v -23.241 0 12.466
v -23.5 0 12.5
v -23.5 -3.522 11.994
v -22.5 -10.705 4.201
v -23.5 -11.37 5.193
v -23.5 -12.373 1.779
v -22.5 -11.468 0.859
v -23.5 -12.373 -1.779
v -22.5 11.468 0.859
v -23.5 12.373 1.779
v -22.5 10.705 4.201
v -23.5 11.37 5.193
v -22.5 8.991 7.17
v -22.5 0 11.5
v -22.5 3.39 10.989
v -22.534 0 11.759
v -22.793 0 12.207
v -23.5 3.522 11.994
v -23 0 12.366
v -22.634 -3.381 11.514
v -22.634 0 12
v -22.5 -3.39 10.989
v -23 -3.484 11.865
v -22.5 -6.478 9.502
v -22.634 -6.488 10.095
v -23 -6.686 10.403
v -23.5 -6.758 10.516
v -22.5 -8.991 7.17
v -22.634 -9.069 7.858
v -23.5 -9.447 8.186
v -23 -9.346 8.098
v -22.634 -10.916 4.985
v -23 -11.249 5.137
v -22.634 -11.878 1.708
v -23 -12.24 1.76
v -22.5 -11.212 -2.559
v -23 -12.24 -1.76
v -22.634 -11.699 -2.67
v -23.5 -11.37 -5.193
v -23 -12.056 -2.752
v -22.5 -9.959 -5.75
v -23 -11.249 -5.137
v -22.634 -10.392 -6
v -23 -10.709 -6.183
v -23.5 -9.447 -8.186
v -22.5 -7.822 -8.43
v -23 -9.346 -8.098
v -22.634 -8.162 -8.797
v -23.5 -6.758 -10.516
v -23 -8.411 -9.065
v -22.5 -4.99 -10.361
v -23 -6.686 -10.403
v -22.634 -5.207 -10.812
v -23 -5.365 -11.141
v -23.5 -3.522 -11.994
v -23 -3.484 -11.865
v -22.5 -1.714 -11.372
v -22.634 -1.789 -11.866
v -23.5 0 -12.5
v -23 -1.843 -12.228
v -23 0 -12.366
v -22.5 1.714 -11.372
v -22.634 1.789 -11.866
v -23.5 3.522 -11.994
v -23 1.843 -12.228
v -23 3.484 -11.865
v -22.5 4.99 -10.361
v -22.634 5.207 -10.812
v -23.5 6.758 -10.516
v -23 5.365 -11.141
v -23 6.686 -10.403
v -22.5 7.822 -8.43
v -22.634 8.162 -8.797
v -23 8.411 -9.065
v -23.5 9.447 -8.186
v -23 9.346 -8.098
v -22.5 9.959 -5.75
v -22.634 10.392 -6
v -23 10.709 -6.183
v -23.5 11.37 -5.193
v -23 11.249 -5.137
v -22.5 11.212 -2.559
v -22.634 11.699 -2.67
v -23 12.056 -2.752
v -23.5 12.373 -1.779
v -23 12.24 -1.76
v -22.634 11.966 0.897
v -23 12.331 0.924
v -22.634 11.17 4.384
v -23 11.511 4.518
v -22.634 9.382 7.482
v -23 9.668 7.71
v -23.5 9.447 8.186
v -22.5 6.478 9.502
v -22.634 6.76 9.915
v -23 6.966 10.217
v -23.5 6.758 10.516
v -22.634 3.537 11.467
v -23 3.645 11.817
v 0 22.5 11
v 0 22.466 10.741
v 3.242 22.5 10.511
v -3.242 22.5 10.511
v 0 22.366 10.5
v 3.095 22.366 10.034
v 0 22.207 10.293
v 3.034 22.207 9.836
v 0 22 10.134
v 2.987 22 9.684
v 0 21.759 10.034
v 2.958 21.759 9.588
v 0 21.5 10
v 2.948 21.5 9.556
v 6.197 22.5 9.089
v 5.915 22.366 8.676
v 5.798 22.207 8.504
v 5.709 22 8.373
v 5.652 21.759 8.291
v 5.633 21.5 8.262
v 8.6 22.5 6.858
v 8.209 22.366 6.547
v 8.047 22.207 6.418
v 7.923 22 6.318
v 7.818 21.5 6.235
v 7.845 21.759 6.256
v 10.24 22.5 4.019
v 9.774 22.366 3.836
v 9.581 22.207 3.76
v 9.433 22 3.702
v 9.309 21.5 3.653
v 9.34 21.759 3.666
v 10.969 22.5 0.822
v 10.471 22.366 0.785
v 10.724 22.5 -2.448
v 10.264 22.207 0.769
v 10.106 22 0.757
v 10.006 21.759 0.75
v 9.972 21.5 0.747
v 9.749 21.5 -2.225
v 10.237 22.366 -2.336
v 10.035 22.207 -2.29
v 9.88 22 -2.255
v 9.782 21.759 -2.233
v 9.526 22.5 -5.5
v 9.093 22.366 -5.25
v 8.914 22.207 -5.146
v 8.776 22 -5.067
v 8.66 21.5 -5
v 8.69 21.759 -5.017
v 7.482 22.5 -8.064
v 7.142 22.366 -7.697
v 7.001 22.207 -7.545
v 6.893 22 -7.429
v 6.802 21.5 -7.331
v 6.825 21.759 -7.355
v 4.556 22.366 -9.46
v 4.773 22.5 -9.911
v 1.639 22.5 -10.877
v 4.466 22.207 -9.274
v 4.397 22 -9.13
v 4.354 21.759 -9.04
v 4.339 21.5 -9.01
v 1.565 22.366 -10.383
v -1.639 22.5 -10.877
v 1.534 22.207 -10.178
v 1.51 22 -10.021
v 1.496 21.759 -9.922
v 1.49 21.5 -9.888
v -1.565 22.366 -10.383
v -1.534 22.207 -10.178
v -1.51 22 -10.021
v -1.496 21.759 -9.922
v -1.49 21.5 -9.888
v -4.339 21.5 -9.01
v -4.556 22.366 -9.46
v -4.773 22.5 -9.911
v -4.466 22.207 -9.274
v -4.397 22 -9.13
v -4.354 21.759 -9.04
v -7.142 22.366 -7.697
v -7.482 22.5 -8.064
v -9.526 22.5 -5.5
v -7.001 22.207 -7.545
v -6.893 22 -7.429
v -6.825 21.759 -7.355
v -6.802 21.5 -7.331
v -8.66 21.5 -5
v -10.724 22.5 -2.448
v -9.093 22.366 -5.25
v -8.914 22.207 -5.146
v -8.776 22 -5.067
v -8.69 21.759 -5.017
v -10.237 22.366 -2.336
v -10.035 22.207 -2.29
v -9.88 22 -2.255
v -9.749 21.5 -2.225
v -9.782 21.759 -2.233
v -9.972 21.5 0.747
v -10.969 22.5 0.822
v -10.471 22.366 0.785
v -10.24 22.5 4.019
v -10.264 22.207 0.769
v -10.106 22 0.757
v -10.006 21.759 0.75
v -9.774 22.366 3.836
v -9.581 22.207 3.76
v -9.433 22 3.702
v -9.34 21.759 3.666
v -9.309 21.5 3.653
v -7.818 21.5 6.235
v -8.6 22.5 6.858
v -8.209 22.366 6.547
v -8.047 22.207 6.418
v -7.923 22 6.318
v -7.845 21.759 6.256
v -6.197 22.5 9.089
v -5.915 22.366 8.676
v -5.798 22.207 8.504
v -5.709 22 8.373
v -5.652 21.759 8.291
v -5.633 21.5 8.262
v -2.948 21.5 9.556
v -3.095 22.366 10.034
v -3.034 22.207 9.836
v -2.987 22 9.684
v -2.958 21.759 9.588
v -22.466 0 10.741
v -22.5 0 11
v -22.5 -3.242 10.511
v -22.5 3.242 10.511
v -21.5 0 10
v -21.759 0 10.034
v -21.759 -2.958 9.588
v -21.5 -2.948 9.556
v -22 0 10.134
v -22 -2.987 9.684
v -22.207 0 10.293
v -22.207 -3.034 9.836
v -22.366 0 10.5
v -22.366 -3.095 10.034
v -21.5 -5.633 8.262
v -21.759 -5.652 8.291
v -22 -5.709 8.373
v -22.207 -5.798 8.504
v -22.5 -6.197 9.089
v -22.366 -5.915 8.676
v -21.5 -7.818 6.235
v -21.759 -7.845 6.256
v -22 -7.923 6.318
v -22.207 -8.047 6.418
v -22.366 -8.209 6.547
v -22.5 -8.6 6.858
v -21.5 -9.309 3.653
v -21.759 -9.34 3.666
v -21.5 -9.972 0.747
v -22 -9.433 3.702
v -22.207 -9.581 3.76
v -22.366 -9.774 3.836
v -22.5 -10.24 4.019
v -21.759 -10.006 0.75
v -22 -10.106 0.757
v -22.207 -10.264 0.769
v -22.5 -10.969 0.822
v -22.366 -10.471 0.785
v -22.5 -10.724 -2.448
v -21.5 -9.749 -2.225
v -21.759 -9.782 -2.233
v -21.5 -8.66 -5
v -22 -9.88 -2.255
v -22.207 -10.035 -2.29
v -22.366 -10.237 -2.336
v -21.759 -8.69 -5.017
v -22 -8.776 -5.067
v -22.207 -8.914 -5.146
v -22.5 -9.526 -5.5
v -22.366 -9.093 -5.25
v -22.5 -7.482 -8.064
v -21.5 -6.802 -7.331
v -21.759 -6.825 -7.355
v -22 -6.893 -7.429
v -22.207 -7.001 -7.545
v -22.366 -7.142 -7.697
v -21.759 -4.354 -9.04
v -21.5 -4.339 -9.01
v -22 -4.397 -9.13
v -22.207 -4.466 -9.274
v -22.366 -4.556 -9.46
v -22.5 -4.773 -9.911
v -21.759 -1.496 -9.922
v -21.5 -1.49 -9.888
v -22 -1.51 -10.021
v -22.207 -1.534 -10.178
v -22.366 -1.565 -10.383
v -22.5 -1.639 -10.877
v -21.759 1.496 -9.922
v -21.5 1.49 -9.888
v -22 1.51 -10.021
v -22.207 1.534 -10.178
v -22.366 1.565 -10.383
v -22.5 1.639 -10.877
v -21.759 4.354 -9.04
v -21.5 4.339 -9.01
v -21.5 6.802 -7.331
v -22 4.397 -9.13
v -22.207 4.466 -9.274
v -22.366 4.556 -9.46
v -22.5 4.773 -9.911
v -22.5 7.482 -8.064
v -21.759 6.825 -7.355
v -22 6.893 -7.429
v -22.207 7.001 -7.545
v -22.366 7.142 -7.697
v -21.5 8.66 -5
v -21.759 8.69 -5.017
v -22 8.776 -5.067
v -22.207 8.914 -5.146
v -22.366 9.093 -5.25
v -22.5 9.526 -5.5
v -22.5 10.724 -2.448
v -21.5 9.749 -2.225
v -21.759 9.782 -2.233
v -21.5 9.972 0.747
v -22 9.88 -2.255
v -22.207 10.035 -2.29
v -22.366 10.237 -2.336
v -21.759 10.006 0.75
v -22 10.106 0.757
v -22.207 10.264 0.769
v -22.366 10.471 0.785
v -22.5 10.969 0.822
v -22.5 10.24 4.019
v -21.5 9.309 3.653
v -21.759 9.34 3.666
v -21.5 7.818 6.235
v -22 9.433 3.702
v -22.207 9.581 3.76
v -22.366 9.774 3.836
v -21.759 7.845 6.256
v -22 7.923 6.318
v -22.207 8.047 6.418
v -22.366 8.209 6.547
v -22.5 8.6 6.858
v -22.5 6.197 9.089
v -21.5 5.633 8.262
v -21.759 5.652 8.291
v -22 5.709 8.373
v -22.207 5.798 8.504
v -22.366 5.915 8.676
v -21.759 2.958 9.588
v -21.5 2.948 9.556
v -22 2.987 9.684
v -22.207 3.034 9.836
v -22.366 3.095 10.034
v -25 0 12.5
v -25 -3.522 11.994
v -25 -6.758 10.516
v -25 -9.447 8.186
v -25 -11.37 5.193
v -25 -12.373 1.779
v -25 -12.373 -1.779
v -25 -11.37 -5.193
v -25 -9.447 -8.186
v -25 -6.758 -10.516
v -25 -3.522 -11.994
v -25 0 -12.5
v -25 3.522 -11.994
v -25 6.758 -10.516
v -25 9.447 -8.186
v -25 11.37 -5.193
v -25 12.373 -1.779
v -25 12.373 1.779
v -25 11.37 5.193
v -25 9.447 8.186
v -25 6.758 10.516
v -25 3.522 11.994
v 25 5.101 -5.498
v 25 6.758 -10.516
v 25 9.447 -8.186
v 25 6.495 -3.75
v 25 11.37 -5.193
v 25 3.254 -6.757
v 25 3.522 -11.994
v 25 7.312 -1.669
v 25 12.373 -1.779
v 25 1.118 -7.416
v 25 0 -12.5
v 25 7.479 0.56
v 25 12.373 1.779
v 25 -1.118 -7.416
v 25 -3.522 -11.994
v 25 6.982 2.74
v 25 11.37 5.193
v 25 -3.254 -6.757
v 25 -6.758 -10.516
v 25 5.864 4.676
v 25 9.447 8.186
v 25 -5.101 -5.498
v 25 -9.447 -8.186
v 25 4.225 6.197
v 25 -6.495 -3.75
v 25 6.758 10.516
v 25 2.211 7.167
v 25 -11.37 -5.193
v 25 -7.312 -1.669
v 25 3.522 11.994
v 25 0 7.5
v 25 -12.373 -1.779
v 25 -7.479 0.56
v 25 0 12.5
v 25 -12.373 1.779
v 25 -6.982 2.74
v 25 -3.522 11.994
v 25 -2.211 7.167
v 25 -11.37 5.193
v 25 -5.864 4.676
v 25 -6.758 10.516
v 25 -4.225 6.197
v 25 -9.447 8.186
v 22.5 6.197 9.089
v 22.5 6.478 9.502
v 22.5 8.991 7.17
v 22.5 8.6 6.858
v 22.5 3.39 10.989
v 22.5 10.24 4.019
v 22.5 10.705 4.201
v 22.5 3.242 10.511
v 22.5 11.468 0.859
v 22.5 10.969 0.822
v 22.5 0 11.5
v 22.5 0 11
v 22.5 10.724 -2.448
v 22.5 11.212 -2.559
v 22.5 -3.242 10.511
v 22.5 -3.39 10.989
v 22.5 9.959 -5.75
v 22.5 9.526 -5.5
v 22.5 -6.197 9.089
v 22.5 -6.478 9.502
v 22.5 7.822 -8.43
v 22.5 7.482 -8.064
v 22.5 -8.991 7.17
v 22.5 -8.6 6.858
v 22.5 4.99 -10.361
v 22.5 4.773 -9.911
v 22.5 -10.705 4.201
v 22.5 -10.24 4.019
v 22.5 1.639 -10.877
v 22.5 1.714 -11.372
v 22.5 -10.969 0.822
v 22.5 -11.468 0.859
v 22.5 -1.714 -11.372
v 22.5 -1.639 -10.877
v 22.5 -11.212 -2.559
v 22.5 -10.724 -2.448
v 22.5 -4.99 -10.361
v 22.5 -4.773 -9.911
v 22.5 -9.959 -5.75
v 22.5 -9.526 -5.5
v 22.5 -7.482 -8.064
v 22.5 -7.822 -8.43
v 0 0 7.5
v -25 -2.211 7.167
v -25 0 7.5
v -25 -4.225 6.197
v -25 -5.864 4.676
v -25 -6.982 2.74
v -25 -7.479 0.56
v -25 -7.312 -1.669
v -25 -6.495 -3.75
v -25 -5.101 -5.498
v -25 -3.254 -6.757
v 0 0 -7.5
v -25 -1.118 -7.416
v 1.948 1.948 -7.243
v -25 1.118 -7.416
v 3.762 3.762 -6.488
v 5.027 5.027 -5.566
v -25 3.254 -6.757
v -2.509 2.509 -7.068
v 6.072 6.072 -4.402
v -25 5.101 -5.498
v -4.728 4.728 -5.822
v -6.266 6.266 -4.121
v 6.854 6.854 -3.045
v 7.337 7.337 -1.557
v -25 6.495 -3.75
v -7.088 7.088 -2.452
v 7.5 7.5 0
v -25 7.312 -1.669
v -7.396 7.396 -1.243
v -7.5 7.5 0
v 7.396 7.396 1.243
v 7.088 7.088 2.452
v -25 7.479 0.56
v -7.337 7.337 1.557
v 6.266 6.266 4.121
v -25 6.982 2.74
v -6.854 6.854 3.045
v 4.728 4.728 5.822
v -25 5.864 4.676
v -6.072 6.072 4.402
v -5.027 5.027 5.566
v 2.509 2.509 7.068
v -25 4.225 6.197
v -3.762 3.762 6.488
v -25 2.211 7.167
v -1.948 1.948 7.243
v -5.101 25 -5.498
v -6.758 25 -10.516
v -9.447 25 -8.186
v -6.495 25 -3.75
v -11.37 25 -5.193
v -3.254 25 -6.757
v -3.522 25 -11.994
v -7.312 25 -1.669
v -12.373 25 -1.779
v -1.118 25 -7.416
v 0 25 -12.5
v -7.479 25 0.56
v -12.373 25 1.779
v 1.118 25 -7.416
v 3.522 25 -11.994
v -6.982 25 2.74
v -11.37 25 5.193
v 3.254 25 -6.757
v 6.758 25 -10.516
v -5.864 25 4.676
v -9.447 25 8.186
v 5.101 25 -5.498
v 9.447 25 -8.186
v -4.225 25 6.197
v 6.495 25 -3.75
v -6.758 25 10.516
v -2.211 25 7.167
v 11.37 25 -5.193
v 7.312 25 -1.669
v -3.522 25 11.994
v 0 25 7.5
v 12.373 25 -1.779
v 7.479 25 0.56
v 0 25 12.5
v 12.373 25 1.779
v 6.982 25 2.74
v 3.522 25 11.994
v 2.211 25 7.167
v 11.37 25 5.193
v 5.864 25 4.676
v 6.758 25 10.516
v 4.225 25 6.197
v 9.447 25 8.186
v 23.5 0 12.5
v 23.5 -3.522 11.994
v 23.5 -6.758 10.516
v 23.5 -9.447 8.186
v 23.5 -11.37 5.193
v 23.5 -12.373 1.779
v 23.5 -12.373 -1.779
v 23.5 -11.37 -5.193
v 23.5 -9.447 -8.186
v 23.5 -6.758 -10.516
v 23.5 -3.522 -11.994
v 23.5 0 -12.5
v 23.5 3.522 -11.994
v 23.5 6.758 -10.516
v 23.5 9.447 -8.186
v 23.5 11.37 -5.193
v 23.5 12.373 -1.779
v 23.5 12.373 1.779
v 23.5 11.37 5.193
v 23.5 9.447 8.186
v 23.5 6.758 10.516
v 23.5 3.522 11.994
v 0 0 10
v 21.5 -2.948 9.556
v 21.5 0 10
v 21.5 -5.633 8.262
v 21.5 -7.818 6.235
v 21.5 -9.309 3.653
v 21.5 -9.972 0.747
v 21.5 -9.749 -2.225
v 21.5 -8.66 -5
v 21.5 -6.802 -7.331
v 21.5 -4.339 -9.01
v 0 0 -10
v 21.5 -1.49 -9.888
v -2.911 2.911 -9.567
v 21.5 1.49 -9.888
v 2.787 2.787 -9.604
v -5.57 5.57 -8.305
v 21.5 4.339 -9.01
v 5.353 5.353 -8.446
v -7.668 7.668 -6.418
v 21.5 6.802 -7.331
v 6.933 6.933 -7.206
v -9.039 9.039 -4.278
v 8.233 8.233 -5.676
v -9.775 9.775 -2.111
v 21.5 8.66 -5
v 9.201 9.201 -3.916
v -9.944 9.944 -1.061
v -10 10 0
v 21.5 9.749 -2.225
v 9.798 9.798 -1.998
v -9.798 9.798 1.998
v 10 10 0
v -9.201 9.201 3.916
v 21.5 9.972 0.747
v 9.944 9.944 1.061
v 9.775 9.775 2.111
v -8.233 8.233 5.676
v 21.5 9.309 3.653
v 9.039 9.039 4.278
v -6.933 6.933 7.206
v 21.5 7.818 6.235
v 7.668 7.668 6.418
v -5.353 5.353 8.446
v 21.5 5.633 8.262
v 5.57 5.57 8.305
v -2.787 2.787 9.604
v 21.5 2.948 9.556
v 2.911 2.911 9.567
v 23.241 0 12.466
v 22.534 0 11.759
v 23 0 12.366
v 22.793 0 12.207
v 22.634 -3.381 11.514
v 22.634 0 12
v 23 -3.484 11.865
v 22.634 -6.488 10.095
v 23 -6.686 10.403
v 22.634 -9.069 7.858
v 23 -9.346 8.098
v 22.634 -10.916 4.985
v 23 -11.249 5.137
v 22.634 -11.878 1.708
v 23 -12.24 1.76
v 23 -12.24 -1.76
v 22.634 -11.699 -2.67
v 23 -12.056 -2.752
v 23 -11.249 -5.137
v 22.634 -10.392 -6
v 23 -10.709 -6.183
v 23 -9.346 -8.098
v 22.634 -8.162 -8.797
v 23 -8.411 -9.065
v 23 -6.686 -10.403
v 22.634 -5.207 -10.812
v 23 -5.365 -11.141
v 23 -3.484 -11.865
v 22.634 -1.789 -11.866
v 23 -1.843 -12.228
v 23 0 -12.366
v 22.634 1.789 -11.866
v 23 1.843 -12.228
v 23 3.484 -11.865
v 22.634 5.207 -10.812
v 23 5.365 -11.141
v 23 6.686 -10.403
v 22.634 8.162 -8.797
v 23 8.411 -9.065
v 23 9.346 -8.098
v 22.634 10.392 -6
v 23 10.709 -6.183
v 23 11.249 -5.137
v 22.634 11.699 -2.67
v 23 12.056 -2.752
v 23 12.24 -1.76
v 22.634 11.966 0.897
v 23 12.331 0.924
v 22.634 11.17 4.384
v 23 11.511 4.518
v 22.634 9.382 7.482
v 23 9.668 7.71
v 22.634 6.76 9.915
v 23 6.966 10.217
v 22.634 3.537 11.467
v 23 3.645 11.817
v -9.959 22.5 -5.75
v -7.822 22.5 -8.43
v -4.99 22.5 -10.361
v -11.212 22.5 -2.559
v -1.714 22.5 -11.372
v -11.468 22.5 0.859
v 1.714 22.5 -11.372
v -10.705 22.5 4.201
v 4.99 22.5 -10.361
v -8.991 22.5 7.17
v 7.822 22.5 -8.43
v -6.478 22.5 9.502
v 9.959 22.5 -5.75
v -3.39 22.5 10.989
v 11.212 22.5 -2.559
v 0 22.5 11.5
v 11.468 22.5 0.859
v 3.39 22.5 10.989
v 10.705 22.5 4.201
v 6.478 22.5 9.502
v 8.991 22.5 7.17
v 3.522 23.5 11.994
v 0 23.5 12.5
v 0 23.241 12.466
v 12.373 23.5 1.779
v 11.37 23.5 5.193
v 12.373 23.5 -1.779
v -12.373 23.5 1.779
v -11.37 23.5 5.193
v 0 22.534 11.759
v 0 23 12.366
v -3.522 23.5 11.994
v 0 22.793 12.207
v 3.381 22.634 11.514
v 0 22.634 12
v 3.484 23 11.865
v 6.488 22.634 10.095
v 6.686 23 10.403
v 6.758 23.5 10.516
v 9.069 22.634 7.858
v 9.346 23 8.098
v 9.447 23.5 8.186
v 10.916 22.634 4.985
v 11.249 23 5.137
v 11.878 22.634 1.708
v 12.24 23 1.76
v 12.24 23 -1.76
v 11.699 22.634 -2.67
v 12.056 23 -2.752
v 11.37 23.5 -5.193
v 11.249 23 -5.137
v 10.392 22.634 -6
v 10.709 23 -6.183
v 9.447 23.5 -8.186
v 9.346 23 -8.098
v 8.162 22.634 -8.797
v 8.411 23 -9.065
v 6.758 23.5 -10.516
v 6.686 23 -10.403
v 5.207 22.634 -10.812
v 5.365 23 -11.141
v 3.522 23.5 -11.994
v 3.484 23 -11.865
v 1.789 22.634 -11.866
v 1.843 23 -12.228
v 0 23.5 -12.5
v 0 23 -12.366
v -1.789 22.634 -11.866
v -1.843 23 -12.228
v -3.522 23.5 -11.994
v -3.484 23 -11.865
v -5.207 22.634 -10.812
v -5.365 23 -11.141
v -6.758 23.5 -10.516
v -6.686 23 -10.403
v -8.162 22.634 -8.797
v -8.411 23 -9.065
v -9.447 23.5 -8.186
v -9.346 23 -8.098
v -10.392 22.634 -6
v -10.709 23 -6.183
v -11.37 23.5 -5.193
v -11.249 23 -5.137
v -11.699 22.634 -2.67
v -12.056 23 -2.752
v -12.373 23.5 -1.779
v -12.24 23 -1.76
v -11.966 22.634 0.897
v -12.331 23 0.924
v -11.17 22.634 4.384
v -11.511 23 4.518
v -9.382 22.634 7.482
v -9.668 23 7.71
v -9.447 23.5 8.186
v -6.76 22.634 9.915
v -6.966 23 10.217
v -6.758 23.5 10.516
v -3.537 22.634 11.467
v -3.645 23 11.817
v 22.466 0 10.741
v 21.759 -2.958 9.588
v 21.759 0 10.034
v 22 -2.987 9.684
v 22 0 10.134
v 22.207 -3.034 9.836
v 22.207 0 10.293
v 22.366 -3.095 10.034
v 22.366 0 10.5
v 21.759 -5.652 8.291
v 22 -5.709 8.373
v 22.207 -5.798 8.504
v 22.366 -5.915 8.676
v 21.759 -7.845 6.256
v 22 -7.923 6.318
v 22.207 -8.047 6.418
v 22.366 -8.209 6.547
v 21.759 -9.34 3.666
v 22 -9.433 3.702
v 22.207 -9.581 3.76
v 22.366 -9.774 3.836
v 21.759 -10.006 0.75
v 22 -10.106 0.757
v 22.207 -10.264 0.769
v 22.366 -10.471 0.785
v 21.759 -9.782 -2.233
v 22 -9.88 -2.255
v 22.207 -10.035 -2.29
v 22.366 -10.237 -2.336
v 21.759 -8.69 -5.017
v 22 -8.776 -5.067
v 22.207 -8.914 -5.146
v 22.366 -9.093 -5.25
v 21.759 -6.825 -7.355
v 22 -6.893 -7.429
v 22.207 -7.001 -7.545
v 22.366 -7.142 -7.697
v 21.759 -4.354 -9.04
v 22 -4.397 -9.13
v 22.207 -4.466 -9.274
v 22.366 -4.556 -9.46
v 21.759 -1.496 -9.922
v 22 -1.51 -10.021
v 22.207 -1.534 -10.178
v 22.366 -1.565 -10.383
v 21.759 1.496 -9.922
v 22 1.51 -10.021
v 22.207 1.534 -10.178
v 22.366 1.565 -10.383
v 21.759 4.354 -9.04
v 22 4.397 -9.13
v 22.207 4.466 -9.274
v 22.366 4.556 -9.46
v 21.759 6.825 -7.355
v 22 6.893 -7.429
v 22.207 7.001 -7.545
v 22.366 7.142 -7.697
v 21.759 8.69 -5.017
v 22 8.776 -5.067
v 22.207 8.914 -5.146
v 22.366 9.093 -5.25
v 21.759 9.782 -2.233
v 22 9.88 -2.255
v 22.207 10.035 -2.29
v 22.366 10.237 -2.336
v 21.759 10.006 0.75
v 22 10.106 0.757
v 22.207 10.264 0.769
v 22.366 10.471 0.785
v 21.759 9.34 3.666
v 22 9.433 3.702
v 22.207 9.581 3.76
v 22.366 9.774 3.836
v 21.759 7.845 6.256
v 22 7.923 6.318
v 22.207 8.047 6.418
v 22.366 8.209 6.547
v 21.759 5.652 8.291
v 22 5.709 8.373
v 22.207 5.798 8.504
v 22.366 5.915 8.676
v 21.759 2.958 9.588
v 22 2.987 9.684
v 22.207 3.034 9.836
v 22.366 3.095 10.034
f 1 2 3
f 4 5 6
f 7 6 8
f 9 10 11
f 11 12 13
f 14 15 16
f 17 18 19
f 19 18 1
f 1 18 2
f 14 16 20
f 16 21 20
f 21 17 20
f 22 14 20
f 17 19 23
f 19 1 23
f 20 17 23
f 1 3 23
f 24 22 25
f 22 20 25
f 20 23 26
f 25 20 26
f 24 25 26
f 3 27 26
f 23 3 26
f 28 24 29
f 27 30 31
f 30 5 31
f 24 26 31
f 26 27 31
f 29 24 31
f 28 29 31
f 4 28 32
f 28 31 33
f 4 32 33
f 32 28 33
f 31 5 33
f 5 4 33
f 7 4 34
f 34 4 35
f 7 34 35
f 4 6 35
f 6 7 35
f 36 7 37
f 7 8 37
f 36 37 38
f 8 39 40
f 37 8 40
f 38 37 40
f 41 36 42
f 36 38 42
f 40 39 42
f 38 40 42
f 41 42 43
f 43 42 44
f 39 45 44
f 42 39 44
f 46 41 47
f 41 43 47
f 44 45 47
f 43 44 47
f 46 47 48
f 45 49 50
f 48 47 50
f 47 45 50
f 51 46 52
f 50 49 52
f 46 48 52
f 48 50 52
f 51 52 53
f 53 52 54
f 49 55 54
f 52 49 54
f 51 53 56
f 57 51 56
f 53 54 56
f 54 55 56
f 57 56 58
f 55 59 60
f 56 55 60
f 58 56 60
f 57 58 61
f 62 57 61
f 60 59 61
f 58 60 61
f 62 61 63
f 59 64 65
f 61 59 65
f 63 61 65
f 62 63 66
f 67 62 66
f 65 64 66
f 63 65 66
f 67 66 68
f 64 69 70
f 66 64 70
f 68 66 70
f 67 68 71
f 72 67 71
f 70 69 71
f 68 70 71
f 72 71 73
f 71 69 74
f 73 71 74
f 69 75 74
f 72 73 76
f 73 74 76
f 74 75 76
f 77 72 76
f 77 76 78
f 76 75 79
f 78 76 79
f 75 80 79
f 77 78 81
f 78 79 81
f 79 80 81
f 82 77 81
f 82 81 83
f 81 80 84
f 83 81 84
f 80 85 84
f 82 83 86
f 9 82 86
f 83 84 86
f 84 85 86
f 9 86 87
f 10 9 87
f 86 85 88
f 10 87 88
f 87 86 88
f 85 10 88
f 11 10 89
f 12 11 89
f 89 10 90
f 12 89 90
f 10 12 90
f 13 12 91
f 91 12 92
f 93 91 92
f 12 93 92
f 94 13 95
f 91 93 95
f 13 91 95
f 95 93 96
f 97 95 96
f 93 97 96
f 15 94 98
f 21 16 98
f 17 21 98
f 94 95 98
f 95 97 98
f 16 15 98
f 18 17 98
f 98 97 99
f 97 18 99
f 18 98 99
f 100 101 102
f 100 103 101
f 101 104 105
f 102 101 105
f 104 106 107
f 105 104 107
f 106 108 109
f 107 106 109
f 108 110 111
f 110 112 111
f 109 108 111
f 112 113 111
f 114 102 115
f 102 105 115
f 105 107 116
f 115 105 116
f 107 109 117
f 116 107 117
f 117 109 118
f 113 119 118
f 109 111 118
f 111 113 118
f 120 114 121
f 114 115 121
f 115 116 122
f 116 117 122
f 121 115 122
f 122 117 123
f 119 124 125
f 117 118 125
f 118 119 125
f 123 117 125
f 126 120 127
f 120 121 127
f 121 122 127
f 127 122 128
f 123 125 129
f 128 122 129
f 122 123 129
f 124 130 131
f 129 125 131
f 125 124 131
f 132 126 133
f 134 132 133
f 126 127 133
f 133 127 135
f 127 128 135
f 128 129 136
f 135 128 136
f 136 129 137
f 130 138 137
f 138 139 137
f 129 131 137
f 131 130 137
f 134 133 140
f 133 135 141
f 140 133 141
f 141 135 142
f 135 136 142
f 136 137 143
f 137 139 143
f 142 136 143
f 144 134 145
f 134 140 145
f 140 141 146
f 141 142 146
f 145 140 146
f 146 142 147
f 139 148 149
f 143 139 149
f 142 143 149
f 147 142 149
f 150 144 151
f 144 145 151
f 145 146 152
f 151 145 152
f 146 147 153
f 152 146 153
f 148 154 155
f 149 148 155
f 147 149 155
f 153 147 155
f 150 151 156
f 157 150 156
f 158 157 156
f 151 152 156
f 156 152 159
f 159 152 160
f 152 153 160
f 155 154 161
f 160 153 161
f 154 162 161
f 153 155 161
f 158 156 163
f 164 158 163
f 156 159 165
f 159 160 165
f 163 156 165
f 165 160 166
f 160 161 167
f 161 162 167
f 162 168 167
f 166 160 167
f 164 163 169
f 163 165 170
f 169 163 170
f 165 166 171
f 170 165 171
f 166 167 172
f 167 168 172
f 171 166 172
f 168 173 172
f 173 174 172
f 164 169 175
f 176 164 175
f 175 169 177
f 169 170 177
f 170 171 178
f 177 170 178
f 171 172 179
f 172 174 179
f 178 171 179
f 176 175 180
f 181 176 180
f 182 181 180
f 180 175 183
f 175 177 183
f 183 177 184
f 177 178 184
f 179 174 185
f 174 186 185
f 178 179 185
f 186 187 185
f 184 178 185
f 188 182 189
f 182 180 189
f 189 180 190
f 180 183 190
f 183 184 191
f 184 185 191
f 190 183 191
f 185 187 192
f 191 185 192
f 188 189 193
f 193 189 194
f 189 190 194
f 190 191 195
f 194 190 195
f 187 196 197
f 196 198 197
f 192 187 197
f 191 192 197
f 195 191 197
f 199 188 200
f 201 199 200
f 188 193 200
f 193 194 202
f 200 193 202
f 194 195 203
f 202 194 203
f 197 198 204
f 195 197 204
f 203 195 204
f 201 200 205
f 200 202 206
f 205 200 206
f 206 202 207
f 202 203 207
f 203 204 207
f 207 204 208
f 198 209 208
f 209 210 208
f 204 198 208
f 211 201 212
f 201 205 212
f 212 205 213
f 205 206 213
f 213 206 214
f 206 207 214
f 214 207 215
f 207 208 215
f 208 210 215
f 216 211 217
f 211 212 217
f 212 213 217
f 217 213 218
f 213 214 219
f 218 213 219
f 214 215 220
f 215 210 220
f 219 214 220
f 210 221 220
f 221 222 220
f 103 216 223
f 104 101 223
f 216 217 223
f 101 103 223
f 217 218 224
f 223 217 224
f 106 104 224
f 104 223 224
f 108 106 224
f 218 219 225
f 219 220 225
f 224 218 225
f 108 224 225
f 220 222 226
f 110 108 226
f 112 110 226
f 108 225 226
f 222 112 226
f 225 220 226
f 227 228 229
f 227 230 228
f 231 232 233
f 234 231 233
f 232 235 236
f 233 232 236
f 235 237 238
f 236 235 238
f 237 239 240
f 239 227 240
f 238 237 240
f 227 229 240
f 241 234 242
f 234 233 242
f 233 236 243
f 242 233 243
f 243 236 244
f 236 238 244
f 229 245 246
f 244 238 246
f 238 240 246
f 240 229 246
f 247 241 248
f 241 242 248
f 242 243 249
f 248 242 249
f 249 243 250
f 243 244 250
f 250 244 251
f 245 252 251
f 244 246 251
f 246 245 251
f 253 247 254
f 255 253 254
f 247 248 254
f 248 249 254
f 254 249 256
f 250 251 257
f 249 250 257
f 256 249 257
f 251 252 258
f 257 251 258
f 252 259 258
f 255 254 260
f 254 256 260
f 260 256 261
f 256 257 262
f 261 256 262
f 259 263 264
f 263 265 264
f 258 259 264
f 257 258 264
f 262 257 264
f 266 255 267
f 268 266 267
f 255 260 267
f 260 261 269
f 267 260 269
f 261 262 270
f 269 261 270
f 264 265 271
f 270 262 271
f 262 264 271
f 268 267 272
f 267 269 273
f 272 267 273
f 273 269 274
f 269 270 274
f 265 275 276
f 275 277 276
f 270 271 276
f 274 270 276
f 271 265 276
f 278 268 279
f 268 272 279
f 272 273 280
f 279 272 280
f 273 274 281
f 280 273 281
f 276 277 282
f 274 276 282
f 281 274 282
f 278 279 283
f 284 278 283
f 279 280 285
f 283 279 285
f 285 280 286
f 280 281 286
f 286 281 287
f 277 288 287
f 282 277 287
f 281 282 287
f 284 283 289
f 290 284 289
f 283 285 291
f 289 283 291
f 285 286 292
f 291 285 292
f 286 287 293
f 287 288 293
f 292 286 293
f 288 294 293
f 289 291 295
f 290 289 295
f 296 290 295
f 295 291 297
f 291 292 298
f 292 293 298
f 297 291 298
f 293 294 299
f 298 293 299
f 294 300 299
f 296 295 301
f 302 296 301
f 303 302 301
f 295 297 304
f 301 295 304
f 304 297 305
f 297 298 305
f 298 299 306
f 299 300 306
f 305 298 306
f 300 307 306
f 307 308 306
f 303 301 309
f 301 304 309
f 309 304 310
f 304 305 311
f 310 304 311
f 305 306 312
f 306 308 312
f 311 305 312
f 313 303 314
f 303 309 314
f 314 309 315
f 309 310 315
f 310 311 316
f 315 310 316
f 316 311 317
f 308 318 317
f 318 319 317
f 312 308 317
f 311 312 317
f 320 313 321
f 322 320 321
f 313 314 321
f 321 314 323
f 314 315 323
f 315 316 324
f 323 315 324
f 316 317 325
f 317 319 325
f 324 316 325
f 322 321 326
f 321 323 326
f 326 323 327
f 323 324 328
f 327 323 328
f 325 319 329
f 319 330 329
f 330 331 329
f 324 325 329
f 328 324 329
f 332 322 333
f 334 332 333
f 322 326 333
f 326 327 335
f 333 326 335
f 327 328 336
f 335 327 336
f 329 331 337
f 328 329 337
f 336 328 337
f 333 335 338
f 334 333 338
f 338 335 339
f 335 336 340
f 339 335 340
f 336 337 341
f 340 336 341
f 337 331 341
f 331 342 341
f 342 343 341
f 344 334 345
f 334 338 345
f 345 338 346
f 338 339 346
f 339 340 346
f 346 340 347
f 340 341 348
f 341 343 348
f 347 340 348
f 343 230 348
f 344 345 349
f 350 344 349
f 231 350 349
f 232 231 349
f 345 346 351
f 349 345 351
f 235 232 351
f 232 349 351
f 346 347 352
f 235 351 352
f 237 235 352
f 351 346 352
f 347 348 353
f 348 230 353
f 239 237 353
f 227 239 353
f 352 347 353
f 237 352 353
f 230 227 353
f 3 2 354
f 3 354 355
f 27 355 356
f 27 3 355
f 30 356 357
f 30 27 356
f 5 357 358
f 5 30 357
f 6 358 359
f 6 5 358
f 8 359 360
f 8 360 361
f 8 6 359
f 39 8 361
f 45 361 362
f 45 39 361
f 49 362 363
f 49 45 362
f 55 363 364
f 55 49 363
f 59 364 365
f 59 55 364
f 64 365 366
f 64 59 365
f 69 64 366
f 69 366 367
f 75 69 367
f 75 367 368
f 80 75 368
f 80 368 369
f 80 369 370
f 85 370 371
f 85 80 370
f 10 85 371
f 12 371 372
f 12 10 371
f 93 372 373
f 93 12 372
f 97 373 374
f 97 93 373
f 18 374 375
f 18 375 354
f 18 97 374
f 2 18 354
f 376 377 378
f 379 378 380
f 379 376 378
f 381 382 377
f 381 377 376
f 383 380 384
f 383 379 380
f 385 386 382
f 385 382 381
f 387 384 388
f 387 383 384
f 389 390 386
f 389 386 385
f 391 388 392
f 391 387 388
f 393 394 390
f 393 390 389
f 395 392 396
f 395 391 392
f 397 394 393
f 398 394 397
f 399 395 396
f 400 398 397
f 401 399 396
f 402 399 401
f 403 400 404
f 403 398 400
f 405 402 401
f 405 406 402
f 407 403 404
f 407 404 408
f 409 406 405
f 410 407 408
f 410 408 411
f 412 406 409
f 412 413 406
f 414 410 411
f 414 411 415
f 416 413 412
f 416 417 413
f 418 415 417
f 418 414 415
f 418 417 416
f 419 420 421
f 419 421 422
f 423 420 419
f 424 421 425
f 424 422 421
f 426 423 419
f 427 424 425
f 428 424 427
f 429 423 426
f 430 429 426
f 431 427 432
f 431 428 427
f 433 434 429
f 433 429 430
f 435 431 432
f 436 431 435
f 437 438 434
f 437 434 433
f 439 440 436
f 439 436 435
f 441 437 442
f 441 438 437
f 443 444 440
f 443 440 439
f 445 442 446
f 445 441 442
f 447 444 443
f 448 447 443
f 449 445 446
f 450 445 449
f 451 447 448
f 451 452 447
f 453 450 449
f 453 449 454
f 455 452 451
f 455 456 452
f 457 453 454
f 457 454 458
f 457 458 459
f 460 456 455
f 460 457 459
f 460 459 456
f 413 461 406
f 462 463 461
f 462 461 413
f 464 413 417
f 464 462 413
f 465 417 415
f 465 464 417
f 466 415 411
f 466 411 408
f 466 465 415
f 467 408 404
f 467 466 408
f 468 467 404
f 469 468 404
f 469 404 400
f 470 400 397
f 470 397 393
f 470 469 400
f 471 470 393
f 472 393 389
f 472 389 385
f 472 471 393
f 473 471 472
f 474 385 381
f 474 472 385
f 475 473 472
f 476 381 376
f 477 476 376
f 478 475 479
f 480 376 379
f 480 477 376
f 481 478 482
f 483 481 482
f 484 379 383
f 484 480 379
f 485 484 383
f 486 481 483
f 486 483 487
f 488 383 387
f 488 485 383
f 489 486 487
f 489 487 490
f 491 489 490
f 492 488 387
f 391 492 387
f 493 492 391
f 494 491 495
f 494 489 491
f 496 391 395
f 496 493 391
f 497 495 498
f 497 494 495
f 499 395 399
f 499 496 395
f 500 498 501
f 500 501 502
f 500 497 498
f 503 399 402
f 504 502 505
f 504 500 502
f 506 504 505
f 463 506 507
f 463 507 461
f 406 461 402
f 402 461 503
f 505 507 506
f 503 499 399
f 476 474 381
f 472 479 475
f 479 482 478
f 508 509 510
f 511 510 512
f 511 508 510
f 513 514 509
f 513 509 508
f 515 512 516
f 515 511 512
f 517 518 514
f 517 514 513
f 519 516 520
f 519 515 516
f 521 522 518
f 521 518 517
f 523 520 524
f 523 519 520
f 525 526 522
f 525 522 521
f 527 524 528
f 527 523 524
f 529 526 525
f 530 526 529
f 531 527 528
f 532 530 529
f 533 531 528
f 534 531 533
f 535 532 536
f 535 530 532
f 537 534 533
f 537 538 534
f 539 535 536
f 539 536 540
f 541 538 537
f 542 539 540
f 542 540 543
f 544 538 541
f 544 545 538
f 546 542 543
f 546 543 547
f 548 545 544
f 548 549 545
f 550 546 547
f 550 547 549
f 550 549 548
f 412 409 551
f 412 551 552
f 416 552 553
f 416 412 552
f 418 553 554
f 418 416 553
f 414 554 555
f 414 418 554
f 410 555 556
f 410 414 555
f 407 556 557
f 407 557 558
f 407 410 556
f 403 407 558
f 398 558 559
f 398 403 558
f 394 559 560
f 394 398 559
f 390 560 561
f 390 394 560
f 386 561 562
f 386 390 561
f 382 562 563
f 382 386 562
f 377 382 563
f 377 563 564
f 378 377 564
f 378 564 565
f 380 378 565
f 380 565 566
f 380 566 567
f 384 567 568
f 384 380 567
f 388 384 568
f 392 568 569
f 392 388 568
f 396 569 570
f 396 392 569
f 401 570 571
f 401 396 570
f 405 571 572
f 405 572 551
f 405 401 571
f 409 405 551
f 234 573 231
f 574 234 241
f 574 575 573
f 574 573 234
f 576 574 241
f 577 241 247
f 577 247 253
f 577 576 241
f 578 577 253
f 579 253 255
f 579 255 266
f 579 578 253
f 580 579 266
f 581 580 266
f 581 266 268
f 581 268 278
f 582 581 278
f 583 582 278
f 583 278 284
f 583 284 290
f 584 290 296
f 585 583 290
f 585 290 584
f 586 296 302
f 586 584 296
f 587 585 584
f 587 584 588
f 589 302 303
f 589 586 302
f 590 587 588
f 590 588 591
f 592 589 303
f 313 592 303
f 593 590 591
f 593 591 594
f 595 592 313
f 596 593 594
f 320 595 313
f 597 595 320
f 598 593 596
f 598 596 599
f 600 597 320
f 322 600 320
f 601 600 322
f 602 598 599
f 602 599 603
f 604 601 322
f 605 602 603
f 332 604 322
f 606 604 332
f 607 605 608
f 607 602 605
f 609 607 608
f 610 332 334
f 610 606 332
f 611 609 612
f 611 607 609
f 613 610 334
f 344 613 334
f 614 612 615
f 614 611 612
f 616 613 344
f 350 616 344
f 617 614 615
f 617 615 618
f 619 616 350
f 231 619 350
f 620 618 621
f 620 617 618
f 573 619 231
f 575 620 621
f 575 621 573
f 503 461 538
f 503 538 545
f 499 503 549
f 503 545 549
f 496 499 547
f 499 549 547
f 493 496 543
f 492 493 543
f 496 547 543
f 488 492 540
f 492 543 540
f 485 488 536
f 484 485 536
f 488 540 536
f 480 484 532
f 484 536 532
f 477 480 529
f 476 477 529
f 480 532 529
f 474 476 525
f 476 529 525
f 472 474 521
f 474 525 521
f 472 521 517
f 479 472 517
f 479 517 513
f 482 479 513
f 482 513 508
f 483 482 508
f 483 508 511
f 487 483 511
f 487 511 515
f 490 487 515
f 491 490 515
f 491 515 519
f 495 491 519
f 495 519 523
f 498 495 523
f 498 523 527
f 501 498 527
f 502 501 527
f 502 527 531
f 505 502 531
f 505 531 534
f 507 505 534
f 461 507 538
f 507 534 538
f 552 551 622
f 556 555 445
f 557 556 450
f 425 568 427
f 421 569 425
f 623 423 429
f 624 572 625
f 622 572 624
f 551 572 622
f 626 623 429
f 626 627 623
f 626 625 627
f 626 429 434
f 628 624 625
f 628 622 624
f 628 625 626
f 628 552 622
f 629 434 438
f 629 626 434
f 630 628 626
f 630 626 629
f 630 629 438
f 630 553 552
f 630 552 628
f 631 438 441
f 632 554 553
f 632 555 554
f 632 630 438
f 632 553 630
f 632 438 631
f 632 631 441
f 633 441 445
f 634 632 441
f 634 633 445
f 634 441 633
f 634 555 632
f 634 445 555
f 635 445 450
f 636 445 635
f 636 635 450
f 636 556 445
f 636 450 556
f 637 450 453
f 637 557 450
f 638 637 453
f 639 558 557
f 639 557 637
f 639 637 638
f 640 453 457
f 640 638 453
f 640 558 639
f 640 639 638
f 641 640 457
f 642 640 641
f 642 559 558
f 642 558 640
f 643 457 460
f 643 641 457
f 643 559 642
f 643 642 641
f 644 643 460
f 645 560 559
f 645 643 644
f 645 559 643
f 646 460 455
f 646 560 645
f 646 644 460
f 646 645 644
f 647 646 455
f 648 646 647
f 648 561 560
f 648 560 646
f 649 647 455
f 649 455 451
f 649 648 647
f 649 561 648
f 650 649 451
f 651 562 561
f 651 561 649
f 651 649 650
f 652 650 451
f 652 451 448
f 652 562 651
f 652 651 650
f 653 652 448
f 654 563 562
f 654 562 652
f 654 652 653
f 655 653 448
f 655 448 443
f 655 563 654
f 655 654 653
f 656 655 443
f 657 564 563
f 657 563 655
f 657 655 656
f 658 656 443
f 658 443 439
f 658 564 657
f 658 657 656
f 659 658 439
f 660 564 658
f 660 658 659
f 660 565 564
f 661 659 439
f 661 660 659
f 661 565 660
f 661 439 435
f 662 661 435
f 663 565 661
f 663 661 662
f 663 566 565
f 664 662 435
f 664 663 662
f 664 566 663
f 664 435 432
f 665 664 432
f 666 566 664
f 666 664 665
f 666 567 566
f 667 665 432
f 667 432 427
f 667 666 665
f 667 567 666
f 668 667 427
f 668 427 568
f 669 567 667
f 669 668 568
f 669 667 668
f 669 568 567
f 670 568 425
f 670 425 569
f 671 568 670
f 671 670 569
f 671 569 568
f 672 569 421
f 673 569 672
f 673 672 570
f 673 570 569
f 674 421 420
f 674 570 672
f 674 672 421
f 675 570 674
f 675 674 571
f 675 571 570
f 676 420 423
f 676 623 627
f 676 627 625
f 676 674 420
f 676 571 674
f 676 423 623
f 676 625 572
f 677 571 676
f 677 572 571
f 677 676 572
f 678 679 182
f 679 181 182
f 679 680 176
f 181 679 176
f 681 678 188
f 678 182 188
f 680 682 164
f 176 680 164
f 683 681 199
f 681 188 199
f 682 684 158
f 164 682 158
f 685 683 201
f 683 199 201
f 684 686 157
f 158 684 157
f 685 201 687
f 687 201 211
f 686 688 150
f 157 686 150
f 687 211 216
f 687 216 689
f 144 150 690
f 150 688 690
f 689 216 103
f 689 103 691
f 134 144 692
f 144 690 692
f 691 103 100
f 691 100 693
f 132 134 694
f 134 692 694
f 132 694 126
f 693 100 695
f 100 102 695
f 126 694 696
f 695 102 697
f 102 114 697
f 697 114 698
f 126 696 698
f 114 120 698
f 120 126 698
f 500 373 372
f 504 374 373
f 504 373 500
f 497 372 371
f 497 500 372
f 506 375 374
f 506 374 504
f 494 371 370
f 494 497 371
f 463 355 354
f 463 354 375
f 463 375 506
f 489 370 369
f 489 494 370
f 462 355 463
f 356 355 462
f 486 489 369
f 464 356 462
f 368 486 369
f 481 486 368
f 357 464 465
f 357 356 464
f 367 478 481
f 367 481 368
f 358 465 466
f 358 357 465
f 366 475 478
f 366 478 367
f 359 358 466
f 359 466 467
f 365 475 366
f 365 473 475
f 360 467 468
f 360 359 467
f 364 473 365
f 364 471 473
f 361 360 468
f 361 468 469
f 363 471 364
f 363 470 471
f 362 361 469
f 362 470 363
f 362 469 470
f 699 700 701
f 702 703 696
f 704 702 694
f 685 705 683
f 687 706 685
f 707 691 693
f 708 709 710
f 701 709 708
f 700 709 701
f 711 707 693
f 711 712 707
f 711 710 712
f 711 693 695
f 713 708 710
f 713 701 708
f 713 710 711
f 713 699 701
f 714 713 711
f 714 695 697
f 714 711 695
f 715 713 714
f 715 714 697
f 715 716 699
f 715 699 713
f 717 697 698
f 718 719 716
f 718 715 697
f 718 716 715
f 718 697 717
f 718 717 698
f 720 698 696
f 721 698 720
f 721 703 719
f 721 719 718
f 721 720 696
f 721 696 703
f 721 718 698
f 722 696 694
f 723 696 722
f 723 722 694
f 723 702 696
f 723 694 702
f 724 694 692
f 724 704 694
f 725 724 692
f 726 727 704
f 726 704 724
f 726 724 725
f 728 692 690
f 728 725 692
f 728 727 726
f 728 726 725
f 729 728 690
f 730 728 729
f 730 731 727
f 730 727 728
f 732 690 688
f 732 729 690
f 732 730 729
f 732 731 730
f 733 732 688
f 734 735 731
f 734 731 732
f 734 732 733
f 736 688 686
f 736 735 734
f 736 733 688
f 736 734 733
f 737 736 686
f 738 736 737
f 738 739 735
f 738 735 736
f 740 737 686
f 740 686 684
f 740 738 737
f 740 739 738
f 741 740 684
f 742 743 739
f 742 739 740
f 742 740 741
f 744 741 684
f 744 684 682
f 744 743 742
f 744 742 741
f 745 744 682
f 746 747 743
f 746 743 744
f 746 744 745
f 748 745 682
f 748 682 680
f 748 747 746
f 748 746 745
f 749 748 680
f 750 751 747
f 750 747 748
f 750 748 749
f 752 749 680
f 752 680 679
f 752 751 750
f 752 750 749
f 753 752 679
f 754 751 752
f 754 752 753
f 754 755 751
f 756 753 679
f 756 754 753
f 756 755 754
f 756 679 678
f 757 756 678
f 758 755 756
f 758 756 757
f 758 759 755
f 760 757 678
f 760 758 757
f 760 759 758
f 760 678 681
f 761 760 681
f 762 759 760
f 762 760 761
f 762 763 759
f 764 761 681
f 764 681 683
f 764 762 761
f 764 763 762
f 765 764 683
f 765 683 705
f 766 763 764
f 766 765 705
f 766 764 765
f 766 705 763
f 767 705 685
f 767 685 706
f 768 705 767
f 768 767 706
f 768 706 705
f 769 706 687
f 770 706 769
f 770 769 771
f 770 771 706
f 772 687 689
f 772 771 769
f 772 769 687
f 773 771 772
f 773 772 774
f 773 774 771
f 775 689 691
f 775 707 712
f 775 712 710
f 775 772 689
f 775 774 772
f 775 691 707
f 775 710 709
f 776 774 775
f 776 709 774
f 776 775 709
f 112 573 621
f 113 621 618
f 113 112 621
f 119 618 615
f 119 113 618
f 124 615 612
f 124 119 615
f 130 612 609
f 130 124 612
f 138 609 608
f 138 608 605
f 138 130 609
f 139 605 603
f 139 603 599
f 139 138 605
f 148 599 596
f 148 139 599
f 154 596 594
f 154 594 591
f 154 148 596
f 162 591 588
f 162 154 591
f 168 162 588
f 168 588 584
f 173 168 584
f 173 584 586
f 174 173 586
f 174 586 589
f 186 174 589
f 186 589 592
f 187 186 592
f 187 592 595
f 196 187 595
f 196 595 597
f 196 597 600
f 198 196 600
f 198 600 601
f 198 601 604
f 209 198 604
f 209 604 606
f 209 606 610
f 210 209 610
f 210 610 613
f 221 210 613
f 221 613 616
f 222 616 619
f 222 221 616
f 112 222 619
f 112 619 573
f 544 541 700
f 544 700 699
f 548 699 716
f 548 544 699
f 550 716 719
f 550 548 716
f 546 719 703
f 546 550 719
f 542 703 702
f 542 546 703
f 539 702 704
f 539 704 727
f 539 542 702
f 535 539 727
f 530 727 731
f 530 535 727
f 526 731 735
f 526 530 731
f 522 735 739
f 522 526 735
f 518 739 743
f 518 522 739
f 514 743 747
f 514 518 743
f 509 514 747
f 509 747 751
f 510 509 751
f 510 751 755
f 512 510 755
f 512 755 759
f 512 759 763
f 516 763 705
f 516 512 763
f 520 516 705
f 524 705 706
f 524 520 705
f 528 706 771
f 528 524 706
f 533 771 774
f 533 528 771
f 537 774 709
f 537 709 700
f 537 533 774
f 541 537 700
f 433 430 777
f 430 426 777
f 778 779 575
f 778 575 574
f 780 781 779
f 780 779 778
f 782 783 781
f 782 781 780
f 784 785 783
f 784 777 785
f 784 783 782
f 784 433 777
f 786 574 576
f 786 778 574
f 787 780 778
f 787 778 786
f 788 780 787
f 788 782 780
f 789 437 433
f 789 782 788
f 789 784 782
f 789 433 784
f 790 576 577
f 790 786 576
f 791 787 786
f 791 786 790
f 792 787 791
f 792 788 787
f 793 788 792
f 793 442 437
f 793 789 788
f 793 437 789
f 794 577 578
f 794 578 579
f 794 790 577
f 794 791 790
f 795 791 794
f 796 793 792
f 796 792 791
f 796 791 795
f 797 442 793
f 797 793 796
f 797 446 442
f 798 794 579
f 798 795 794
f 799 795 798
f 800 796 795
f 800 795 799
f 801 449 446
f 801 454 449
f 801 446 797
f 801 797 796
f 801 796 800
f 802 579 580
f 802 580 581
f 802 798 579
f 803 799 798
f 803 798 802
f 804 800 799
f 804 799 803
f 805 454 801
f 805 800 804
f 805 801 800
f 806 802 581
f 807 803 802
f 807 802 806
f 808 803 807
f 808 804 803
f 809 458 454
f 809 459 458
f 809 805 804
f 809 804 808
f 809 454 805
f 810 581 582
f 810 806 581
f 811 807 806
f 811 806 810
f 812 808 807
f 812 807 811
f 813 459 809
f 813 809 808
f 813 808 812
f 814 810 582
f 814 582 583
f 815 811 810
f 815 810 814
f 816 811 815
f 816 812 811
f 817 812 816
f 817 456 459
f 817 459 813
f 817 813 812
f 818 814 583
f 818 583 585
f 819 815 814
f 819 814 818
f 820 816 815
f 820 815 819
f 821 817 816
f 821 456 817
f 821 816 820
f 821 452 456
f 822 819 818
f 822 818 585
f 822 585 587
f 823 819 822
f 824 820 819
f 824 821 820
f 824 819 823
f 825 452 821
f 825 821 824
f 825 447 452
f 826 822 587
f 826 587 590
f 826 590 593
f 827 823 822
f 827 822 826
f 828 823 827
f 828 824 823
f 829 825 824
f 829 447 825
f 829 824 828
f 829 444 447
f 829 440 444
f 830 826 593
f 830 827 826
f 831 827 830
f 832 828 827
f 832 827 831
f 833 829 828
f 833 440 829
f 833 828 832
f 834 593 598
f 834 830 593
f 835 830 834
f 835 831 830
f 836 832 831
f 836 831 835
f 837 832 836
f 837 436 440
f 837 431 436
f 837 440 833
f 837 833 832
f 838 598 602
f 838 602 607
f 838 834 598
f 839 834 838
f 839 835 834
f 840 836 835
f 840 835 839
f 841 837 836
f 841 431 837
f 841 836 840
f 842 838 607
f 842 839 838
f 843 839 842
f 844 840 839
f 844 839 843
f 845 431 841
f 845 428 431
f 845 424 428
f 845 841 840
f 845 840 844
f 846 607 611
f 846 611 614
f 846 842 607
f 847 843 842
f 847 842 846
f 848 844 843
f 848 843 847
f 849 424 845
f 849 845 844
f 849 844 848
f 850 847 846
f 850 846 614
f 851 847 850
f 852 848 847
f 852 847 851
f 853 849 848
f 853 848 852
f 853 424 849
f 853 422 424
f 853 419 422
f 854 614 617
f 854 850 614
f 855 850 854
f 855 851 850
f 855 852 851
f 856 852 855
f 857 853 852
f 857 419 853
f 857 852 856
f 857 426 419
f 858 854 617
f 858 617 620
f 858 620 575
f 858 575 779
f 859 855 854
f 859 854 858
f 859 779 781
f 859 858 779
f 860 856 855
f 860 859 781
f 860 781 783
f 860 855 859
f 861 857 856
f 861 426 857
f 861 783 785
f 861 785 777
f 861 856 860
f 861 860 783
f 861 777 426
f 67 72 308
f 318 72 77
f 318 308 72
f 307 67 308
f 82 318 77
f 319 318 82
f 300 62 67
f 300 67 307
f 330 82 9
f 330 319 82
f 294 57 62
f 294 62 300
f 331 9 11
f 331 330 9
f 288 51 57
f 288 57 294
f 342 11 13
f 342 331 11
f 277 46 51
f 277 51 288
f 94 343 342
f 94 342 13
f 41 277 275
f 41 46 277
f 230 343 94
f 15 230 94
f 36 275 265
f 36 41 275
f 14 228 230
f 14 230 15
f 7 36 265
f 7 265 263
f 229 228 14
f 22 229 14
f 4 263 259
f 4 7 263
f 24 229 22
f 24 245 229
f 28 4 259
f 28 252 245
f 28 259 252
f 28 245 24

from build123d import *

# Parameters (mm, degrees)
BOSS_EXTRUDE1_REACH      = 48.771
BOSS_EXTRUDE1_END_RADIUS = 10
SKETCH2_R                = 10
SKETCH3_R                = 12.5
BOSS_EXTRUDE2_DEPTH      = 2.5
CUT_EXTRUDE1_REACH       = 48.771
CUT_EXTRUDE1_END_RADIUS  = 7.5
SKETCH6_R                = 7.5
FILLET1_R                = 1
FILLET2_R                = 1


with BuildPart() as part:
    # Sketch1 → Revolve1 (revolve)
    with BuildSketch(Plane.XY, mode=Mode.PRIVATE) as revolve1_sk:
        Polygon((-25, 7.5), (-25, 12.5), (-22.5, 12.5), (-22.5, 10), (22.5, 10), (22.5, 12.5), (25, 12.5), (25, 7.5), align=None)
    revolve(revolve1_sk.sketch.rotate(Axis((0, 0, 0), (1, 0, 0)), 90), axis=Axis((0, 0, 0), (1, 0, 0)))

    # Boss-Extrude1: up to this cylinder (the profile starts outside it)
    boss_extrude1_end = Plane(origin=(0, 0, 0), z_dir=(-1, 0, 0)) * Cylinder(BOSS_EXTRUDE1_END_RADIUS, 118.542, mode=Mode.PRIVATE)
    # Sketch2 → Boss-Extrude1 (add, up to the surface)
    with BuildSketch(Plane(origin=(0, 25, 0), x_dir=(1, 0, 0), z_dir=(0, 1, 0)), mode=Mode.PRIVATE) as boss_extrude1_sk1:
        with Locations(Location((0, 0, 0), (0, 0, 270))):
            Circle(SKETCH2_R)
    boss_extrude1_tool1 = extrude(boss_extrude1_sk1.sketch, amount=-BOSS_EXTRUDE1_REACH, mode=Mode.PRIVATE) - boss_extrude1_end
    add(boss_extrude1_tool1.solids().sort_by_distance((0, 25, 0))[0])

    # Sketch3 → Boss-Extrude2 (add)
    with BuildSketch(Plane(origin=(0, 25, 0), x_dir=(1, 0, 0), z_dir=(0, 1, 0))):
        with Locations(Location((0, 0, 0), (0, 0, 270))):
            Circle(SKETCH3_R)
    extrude(amount=-BOSS_EXTRUDE2_DEPTH)

    # Cut-Extrude1: up to this cylinder (the profile starts outside it)
    cut_extrude1_end = Plane(origin=(0, 0, 0), z_dir=(-1, 0, 0)) * Cylinder(CUT_EXTRUDE1_END_RADIUS, 113.542, mode=Mode.PRIVATE)
    # Sketch6 → Cut-Extrude1 (cut, up to the surface)
    with BuildSketch(Plane(origin=(0, 25, 0), x_dir=(1, 0, 0), z_dir=(0, 1, 0)), mode=Mode.PRIVATE) as cut_extrude1_sk1:
        with Locations(Location((0, 0, 0), (0, 0, 270))):
            Circle(SKETCH6_R)
    cut_extrude1_tool1 = extrude(cut_extrude1_sk1.sketch, amount=-CUT_EXTRUDE1_REACH, mode=Mode.PRIVATE) - cut_extrude1_end
    add(cut_extrude1_tool1.solids().sort_by_distance((0, 25, 0))[0], mode=Mode.SUBTRACT)

    # Fillet1
    fillet1_edges = [part.edges().sort_by_distance(p)[0] for p in [
        (0, 22.5, -10),
        (22.5, 0, -10),
        (-22.5, 0, -10),
    ]]
    fillet(fillet1_edges, radius=FILLET1_R)

    # Fillet2
    fillet2_edges = [part.edges().sort_by_distance(p)[0] for p in [
        (0, 22.5, -12.5),
        (22.5, 0, -12.5),
        (-22.5, 0, -12.5),
    ]]
    fillet(fillet2_edges, radius=FILLET2_R)


solid = part.part
